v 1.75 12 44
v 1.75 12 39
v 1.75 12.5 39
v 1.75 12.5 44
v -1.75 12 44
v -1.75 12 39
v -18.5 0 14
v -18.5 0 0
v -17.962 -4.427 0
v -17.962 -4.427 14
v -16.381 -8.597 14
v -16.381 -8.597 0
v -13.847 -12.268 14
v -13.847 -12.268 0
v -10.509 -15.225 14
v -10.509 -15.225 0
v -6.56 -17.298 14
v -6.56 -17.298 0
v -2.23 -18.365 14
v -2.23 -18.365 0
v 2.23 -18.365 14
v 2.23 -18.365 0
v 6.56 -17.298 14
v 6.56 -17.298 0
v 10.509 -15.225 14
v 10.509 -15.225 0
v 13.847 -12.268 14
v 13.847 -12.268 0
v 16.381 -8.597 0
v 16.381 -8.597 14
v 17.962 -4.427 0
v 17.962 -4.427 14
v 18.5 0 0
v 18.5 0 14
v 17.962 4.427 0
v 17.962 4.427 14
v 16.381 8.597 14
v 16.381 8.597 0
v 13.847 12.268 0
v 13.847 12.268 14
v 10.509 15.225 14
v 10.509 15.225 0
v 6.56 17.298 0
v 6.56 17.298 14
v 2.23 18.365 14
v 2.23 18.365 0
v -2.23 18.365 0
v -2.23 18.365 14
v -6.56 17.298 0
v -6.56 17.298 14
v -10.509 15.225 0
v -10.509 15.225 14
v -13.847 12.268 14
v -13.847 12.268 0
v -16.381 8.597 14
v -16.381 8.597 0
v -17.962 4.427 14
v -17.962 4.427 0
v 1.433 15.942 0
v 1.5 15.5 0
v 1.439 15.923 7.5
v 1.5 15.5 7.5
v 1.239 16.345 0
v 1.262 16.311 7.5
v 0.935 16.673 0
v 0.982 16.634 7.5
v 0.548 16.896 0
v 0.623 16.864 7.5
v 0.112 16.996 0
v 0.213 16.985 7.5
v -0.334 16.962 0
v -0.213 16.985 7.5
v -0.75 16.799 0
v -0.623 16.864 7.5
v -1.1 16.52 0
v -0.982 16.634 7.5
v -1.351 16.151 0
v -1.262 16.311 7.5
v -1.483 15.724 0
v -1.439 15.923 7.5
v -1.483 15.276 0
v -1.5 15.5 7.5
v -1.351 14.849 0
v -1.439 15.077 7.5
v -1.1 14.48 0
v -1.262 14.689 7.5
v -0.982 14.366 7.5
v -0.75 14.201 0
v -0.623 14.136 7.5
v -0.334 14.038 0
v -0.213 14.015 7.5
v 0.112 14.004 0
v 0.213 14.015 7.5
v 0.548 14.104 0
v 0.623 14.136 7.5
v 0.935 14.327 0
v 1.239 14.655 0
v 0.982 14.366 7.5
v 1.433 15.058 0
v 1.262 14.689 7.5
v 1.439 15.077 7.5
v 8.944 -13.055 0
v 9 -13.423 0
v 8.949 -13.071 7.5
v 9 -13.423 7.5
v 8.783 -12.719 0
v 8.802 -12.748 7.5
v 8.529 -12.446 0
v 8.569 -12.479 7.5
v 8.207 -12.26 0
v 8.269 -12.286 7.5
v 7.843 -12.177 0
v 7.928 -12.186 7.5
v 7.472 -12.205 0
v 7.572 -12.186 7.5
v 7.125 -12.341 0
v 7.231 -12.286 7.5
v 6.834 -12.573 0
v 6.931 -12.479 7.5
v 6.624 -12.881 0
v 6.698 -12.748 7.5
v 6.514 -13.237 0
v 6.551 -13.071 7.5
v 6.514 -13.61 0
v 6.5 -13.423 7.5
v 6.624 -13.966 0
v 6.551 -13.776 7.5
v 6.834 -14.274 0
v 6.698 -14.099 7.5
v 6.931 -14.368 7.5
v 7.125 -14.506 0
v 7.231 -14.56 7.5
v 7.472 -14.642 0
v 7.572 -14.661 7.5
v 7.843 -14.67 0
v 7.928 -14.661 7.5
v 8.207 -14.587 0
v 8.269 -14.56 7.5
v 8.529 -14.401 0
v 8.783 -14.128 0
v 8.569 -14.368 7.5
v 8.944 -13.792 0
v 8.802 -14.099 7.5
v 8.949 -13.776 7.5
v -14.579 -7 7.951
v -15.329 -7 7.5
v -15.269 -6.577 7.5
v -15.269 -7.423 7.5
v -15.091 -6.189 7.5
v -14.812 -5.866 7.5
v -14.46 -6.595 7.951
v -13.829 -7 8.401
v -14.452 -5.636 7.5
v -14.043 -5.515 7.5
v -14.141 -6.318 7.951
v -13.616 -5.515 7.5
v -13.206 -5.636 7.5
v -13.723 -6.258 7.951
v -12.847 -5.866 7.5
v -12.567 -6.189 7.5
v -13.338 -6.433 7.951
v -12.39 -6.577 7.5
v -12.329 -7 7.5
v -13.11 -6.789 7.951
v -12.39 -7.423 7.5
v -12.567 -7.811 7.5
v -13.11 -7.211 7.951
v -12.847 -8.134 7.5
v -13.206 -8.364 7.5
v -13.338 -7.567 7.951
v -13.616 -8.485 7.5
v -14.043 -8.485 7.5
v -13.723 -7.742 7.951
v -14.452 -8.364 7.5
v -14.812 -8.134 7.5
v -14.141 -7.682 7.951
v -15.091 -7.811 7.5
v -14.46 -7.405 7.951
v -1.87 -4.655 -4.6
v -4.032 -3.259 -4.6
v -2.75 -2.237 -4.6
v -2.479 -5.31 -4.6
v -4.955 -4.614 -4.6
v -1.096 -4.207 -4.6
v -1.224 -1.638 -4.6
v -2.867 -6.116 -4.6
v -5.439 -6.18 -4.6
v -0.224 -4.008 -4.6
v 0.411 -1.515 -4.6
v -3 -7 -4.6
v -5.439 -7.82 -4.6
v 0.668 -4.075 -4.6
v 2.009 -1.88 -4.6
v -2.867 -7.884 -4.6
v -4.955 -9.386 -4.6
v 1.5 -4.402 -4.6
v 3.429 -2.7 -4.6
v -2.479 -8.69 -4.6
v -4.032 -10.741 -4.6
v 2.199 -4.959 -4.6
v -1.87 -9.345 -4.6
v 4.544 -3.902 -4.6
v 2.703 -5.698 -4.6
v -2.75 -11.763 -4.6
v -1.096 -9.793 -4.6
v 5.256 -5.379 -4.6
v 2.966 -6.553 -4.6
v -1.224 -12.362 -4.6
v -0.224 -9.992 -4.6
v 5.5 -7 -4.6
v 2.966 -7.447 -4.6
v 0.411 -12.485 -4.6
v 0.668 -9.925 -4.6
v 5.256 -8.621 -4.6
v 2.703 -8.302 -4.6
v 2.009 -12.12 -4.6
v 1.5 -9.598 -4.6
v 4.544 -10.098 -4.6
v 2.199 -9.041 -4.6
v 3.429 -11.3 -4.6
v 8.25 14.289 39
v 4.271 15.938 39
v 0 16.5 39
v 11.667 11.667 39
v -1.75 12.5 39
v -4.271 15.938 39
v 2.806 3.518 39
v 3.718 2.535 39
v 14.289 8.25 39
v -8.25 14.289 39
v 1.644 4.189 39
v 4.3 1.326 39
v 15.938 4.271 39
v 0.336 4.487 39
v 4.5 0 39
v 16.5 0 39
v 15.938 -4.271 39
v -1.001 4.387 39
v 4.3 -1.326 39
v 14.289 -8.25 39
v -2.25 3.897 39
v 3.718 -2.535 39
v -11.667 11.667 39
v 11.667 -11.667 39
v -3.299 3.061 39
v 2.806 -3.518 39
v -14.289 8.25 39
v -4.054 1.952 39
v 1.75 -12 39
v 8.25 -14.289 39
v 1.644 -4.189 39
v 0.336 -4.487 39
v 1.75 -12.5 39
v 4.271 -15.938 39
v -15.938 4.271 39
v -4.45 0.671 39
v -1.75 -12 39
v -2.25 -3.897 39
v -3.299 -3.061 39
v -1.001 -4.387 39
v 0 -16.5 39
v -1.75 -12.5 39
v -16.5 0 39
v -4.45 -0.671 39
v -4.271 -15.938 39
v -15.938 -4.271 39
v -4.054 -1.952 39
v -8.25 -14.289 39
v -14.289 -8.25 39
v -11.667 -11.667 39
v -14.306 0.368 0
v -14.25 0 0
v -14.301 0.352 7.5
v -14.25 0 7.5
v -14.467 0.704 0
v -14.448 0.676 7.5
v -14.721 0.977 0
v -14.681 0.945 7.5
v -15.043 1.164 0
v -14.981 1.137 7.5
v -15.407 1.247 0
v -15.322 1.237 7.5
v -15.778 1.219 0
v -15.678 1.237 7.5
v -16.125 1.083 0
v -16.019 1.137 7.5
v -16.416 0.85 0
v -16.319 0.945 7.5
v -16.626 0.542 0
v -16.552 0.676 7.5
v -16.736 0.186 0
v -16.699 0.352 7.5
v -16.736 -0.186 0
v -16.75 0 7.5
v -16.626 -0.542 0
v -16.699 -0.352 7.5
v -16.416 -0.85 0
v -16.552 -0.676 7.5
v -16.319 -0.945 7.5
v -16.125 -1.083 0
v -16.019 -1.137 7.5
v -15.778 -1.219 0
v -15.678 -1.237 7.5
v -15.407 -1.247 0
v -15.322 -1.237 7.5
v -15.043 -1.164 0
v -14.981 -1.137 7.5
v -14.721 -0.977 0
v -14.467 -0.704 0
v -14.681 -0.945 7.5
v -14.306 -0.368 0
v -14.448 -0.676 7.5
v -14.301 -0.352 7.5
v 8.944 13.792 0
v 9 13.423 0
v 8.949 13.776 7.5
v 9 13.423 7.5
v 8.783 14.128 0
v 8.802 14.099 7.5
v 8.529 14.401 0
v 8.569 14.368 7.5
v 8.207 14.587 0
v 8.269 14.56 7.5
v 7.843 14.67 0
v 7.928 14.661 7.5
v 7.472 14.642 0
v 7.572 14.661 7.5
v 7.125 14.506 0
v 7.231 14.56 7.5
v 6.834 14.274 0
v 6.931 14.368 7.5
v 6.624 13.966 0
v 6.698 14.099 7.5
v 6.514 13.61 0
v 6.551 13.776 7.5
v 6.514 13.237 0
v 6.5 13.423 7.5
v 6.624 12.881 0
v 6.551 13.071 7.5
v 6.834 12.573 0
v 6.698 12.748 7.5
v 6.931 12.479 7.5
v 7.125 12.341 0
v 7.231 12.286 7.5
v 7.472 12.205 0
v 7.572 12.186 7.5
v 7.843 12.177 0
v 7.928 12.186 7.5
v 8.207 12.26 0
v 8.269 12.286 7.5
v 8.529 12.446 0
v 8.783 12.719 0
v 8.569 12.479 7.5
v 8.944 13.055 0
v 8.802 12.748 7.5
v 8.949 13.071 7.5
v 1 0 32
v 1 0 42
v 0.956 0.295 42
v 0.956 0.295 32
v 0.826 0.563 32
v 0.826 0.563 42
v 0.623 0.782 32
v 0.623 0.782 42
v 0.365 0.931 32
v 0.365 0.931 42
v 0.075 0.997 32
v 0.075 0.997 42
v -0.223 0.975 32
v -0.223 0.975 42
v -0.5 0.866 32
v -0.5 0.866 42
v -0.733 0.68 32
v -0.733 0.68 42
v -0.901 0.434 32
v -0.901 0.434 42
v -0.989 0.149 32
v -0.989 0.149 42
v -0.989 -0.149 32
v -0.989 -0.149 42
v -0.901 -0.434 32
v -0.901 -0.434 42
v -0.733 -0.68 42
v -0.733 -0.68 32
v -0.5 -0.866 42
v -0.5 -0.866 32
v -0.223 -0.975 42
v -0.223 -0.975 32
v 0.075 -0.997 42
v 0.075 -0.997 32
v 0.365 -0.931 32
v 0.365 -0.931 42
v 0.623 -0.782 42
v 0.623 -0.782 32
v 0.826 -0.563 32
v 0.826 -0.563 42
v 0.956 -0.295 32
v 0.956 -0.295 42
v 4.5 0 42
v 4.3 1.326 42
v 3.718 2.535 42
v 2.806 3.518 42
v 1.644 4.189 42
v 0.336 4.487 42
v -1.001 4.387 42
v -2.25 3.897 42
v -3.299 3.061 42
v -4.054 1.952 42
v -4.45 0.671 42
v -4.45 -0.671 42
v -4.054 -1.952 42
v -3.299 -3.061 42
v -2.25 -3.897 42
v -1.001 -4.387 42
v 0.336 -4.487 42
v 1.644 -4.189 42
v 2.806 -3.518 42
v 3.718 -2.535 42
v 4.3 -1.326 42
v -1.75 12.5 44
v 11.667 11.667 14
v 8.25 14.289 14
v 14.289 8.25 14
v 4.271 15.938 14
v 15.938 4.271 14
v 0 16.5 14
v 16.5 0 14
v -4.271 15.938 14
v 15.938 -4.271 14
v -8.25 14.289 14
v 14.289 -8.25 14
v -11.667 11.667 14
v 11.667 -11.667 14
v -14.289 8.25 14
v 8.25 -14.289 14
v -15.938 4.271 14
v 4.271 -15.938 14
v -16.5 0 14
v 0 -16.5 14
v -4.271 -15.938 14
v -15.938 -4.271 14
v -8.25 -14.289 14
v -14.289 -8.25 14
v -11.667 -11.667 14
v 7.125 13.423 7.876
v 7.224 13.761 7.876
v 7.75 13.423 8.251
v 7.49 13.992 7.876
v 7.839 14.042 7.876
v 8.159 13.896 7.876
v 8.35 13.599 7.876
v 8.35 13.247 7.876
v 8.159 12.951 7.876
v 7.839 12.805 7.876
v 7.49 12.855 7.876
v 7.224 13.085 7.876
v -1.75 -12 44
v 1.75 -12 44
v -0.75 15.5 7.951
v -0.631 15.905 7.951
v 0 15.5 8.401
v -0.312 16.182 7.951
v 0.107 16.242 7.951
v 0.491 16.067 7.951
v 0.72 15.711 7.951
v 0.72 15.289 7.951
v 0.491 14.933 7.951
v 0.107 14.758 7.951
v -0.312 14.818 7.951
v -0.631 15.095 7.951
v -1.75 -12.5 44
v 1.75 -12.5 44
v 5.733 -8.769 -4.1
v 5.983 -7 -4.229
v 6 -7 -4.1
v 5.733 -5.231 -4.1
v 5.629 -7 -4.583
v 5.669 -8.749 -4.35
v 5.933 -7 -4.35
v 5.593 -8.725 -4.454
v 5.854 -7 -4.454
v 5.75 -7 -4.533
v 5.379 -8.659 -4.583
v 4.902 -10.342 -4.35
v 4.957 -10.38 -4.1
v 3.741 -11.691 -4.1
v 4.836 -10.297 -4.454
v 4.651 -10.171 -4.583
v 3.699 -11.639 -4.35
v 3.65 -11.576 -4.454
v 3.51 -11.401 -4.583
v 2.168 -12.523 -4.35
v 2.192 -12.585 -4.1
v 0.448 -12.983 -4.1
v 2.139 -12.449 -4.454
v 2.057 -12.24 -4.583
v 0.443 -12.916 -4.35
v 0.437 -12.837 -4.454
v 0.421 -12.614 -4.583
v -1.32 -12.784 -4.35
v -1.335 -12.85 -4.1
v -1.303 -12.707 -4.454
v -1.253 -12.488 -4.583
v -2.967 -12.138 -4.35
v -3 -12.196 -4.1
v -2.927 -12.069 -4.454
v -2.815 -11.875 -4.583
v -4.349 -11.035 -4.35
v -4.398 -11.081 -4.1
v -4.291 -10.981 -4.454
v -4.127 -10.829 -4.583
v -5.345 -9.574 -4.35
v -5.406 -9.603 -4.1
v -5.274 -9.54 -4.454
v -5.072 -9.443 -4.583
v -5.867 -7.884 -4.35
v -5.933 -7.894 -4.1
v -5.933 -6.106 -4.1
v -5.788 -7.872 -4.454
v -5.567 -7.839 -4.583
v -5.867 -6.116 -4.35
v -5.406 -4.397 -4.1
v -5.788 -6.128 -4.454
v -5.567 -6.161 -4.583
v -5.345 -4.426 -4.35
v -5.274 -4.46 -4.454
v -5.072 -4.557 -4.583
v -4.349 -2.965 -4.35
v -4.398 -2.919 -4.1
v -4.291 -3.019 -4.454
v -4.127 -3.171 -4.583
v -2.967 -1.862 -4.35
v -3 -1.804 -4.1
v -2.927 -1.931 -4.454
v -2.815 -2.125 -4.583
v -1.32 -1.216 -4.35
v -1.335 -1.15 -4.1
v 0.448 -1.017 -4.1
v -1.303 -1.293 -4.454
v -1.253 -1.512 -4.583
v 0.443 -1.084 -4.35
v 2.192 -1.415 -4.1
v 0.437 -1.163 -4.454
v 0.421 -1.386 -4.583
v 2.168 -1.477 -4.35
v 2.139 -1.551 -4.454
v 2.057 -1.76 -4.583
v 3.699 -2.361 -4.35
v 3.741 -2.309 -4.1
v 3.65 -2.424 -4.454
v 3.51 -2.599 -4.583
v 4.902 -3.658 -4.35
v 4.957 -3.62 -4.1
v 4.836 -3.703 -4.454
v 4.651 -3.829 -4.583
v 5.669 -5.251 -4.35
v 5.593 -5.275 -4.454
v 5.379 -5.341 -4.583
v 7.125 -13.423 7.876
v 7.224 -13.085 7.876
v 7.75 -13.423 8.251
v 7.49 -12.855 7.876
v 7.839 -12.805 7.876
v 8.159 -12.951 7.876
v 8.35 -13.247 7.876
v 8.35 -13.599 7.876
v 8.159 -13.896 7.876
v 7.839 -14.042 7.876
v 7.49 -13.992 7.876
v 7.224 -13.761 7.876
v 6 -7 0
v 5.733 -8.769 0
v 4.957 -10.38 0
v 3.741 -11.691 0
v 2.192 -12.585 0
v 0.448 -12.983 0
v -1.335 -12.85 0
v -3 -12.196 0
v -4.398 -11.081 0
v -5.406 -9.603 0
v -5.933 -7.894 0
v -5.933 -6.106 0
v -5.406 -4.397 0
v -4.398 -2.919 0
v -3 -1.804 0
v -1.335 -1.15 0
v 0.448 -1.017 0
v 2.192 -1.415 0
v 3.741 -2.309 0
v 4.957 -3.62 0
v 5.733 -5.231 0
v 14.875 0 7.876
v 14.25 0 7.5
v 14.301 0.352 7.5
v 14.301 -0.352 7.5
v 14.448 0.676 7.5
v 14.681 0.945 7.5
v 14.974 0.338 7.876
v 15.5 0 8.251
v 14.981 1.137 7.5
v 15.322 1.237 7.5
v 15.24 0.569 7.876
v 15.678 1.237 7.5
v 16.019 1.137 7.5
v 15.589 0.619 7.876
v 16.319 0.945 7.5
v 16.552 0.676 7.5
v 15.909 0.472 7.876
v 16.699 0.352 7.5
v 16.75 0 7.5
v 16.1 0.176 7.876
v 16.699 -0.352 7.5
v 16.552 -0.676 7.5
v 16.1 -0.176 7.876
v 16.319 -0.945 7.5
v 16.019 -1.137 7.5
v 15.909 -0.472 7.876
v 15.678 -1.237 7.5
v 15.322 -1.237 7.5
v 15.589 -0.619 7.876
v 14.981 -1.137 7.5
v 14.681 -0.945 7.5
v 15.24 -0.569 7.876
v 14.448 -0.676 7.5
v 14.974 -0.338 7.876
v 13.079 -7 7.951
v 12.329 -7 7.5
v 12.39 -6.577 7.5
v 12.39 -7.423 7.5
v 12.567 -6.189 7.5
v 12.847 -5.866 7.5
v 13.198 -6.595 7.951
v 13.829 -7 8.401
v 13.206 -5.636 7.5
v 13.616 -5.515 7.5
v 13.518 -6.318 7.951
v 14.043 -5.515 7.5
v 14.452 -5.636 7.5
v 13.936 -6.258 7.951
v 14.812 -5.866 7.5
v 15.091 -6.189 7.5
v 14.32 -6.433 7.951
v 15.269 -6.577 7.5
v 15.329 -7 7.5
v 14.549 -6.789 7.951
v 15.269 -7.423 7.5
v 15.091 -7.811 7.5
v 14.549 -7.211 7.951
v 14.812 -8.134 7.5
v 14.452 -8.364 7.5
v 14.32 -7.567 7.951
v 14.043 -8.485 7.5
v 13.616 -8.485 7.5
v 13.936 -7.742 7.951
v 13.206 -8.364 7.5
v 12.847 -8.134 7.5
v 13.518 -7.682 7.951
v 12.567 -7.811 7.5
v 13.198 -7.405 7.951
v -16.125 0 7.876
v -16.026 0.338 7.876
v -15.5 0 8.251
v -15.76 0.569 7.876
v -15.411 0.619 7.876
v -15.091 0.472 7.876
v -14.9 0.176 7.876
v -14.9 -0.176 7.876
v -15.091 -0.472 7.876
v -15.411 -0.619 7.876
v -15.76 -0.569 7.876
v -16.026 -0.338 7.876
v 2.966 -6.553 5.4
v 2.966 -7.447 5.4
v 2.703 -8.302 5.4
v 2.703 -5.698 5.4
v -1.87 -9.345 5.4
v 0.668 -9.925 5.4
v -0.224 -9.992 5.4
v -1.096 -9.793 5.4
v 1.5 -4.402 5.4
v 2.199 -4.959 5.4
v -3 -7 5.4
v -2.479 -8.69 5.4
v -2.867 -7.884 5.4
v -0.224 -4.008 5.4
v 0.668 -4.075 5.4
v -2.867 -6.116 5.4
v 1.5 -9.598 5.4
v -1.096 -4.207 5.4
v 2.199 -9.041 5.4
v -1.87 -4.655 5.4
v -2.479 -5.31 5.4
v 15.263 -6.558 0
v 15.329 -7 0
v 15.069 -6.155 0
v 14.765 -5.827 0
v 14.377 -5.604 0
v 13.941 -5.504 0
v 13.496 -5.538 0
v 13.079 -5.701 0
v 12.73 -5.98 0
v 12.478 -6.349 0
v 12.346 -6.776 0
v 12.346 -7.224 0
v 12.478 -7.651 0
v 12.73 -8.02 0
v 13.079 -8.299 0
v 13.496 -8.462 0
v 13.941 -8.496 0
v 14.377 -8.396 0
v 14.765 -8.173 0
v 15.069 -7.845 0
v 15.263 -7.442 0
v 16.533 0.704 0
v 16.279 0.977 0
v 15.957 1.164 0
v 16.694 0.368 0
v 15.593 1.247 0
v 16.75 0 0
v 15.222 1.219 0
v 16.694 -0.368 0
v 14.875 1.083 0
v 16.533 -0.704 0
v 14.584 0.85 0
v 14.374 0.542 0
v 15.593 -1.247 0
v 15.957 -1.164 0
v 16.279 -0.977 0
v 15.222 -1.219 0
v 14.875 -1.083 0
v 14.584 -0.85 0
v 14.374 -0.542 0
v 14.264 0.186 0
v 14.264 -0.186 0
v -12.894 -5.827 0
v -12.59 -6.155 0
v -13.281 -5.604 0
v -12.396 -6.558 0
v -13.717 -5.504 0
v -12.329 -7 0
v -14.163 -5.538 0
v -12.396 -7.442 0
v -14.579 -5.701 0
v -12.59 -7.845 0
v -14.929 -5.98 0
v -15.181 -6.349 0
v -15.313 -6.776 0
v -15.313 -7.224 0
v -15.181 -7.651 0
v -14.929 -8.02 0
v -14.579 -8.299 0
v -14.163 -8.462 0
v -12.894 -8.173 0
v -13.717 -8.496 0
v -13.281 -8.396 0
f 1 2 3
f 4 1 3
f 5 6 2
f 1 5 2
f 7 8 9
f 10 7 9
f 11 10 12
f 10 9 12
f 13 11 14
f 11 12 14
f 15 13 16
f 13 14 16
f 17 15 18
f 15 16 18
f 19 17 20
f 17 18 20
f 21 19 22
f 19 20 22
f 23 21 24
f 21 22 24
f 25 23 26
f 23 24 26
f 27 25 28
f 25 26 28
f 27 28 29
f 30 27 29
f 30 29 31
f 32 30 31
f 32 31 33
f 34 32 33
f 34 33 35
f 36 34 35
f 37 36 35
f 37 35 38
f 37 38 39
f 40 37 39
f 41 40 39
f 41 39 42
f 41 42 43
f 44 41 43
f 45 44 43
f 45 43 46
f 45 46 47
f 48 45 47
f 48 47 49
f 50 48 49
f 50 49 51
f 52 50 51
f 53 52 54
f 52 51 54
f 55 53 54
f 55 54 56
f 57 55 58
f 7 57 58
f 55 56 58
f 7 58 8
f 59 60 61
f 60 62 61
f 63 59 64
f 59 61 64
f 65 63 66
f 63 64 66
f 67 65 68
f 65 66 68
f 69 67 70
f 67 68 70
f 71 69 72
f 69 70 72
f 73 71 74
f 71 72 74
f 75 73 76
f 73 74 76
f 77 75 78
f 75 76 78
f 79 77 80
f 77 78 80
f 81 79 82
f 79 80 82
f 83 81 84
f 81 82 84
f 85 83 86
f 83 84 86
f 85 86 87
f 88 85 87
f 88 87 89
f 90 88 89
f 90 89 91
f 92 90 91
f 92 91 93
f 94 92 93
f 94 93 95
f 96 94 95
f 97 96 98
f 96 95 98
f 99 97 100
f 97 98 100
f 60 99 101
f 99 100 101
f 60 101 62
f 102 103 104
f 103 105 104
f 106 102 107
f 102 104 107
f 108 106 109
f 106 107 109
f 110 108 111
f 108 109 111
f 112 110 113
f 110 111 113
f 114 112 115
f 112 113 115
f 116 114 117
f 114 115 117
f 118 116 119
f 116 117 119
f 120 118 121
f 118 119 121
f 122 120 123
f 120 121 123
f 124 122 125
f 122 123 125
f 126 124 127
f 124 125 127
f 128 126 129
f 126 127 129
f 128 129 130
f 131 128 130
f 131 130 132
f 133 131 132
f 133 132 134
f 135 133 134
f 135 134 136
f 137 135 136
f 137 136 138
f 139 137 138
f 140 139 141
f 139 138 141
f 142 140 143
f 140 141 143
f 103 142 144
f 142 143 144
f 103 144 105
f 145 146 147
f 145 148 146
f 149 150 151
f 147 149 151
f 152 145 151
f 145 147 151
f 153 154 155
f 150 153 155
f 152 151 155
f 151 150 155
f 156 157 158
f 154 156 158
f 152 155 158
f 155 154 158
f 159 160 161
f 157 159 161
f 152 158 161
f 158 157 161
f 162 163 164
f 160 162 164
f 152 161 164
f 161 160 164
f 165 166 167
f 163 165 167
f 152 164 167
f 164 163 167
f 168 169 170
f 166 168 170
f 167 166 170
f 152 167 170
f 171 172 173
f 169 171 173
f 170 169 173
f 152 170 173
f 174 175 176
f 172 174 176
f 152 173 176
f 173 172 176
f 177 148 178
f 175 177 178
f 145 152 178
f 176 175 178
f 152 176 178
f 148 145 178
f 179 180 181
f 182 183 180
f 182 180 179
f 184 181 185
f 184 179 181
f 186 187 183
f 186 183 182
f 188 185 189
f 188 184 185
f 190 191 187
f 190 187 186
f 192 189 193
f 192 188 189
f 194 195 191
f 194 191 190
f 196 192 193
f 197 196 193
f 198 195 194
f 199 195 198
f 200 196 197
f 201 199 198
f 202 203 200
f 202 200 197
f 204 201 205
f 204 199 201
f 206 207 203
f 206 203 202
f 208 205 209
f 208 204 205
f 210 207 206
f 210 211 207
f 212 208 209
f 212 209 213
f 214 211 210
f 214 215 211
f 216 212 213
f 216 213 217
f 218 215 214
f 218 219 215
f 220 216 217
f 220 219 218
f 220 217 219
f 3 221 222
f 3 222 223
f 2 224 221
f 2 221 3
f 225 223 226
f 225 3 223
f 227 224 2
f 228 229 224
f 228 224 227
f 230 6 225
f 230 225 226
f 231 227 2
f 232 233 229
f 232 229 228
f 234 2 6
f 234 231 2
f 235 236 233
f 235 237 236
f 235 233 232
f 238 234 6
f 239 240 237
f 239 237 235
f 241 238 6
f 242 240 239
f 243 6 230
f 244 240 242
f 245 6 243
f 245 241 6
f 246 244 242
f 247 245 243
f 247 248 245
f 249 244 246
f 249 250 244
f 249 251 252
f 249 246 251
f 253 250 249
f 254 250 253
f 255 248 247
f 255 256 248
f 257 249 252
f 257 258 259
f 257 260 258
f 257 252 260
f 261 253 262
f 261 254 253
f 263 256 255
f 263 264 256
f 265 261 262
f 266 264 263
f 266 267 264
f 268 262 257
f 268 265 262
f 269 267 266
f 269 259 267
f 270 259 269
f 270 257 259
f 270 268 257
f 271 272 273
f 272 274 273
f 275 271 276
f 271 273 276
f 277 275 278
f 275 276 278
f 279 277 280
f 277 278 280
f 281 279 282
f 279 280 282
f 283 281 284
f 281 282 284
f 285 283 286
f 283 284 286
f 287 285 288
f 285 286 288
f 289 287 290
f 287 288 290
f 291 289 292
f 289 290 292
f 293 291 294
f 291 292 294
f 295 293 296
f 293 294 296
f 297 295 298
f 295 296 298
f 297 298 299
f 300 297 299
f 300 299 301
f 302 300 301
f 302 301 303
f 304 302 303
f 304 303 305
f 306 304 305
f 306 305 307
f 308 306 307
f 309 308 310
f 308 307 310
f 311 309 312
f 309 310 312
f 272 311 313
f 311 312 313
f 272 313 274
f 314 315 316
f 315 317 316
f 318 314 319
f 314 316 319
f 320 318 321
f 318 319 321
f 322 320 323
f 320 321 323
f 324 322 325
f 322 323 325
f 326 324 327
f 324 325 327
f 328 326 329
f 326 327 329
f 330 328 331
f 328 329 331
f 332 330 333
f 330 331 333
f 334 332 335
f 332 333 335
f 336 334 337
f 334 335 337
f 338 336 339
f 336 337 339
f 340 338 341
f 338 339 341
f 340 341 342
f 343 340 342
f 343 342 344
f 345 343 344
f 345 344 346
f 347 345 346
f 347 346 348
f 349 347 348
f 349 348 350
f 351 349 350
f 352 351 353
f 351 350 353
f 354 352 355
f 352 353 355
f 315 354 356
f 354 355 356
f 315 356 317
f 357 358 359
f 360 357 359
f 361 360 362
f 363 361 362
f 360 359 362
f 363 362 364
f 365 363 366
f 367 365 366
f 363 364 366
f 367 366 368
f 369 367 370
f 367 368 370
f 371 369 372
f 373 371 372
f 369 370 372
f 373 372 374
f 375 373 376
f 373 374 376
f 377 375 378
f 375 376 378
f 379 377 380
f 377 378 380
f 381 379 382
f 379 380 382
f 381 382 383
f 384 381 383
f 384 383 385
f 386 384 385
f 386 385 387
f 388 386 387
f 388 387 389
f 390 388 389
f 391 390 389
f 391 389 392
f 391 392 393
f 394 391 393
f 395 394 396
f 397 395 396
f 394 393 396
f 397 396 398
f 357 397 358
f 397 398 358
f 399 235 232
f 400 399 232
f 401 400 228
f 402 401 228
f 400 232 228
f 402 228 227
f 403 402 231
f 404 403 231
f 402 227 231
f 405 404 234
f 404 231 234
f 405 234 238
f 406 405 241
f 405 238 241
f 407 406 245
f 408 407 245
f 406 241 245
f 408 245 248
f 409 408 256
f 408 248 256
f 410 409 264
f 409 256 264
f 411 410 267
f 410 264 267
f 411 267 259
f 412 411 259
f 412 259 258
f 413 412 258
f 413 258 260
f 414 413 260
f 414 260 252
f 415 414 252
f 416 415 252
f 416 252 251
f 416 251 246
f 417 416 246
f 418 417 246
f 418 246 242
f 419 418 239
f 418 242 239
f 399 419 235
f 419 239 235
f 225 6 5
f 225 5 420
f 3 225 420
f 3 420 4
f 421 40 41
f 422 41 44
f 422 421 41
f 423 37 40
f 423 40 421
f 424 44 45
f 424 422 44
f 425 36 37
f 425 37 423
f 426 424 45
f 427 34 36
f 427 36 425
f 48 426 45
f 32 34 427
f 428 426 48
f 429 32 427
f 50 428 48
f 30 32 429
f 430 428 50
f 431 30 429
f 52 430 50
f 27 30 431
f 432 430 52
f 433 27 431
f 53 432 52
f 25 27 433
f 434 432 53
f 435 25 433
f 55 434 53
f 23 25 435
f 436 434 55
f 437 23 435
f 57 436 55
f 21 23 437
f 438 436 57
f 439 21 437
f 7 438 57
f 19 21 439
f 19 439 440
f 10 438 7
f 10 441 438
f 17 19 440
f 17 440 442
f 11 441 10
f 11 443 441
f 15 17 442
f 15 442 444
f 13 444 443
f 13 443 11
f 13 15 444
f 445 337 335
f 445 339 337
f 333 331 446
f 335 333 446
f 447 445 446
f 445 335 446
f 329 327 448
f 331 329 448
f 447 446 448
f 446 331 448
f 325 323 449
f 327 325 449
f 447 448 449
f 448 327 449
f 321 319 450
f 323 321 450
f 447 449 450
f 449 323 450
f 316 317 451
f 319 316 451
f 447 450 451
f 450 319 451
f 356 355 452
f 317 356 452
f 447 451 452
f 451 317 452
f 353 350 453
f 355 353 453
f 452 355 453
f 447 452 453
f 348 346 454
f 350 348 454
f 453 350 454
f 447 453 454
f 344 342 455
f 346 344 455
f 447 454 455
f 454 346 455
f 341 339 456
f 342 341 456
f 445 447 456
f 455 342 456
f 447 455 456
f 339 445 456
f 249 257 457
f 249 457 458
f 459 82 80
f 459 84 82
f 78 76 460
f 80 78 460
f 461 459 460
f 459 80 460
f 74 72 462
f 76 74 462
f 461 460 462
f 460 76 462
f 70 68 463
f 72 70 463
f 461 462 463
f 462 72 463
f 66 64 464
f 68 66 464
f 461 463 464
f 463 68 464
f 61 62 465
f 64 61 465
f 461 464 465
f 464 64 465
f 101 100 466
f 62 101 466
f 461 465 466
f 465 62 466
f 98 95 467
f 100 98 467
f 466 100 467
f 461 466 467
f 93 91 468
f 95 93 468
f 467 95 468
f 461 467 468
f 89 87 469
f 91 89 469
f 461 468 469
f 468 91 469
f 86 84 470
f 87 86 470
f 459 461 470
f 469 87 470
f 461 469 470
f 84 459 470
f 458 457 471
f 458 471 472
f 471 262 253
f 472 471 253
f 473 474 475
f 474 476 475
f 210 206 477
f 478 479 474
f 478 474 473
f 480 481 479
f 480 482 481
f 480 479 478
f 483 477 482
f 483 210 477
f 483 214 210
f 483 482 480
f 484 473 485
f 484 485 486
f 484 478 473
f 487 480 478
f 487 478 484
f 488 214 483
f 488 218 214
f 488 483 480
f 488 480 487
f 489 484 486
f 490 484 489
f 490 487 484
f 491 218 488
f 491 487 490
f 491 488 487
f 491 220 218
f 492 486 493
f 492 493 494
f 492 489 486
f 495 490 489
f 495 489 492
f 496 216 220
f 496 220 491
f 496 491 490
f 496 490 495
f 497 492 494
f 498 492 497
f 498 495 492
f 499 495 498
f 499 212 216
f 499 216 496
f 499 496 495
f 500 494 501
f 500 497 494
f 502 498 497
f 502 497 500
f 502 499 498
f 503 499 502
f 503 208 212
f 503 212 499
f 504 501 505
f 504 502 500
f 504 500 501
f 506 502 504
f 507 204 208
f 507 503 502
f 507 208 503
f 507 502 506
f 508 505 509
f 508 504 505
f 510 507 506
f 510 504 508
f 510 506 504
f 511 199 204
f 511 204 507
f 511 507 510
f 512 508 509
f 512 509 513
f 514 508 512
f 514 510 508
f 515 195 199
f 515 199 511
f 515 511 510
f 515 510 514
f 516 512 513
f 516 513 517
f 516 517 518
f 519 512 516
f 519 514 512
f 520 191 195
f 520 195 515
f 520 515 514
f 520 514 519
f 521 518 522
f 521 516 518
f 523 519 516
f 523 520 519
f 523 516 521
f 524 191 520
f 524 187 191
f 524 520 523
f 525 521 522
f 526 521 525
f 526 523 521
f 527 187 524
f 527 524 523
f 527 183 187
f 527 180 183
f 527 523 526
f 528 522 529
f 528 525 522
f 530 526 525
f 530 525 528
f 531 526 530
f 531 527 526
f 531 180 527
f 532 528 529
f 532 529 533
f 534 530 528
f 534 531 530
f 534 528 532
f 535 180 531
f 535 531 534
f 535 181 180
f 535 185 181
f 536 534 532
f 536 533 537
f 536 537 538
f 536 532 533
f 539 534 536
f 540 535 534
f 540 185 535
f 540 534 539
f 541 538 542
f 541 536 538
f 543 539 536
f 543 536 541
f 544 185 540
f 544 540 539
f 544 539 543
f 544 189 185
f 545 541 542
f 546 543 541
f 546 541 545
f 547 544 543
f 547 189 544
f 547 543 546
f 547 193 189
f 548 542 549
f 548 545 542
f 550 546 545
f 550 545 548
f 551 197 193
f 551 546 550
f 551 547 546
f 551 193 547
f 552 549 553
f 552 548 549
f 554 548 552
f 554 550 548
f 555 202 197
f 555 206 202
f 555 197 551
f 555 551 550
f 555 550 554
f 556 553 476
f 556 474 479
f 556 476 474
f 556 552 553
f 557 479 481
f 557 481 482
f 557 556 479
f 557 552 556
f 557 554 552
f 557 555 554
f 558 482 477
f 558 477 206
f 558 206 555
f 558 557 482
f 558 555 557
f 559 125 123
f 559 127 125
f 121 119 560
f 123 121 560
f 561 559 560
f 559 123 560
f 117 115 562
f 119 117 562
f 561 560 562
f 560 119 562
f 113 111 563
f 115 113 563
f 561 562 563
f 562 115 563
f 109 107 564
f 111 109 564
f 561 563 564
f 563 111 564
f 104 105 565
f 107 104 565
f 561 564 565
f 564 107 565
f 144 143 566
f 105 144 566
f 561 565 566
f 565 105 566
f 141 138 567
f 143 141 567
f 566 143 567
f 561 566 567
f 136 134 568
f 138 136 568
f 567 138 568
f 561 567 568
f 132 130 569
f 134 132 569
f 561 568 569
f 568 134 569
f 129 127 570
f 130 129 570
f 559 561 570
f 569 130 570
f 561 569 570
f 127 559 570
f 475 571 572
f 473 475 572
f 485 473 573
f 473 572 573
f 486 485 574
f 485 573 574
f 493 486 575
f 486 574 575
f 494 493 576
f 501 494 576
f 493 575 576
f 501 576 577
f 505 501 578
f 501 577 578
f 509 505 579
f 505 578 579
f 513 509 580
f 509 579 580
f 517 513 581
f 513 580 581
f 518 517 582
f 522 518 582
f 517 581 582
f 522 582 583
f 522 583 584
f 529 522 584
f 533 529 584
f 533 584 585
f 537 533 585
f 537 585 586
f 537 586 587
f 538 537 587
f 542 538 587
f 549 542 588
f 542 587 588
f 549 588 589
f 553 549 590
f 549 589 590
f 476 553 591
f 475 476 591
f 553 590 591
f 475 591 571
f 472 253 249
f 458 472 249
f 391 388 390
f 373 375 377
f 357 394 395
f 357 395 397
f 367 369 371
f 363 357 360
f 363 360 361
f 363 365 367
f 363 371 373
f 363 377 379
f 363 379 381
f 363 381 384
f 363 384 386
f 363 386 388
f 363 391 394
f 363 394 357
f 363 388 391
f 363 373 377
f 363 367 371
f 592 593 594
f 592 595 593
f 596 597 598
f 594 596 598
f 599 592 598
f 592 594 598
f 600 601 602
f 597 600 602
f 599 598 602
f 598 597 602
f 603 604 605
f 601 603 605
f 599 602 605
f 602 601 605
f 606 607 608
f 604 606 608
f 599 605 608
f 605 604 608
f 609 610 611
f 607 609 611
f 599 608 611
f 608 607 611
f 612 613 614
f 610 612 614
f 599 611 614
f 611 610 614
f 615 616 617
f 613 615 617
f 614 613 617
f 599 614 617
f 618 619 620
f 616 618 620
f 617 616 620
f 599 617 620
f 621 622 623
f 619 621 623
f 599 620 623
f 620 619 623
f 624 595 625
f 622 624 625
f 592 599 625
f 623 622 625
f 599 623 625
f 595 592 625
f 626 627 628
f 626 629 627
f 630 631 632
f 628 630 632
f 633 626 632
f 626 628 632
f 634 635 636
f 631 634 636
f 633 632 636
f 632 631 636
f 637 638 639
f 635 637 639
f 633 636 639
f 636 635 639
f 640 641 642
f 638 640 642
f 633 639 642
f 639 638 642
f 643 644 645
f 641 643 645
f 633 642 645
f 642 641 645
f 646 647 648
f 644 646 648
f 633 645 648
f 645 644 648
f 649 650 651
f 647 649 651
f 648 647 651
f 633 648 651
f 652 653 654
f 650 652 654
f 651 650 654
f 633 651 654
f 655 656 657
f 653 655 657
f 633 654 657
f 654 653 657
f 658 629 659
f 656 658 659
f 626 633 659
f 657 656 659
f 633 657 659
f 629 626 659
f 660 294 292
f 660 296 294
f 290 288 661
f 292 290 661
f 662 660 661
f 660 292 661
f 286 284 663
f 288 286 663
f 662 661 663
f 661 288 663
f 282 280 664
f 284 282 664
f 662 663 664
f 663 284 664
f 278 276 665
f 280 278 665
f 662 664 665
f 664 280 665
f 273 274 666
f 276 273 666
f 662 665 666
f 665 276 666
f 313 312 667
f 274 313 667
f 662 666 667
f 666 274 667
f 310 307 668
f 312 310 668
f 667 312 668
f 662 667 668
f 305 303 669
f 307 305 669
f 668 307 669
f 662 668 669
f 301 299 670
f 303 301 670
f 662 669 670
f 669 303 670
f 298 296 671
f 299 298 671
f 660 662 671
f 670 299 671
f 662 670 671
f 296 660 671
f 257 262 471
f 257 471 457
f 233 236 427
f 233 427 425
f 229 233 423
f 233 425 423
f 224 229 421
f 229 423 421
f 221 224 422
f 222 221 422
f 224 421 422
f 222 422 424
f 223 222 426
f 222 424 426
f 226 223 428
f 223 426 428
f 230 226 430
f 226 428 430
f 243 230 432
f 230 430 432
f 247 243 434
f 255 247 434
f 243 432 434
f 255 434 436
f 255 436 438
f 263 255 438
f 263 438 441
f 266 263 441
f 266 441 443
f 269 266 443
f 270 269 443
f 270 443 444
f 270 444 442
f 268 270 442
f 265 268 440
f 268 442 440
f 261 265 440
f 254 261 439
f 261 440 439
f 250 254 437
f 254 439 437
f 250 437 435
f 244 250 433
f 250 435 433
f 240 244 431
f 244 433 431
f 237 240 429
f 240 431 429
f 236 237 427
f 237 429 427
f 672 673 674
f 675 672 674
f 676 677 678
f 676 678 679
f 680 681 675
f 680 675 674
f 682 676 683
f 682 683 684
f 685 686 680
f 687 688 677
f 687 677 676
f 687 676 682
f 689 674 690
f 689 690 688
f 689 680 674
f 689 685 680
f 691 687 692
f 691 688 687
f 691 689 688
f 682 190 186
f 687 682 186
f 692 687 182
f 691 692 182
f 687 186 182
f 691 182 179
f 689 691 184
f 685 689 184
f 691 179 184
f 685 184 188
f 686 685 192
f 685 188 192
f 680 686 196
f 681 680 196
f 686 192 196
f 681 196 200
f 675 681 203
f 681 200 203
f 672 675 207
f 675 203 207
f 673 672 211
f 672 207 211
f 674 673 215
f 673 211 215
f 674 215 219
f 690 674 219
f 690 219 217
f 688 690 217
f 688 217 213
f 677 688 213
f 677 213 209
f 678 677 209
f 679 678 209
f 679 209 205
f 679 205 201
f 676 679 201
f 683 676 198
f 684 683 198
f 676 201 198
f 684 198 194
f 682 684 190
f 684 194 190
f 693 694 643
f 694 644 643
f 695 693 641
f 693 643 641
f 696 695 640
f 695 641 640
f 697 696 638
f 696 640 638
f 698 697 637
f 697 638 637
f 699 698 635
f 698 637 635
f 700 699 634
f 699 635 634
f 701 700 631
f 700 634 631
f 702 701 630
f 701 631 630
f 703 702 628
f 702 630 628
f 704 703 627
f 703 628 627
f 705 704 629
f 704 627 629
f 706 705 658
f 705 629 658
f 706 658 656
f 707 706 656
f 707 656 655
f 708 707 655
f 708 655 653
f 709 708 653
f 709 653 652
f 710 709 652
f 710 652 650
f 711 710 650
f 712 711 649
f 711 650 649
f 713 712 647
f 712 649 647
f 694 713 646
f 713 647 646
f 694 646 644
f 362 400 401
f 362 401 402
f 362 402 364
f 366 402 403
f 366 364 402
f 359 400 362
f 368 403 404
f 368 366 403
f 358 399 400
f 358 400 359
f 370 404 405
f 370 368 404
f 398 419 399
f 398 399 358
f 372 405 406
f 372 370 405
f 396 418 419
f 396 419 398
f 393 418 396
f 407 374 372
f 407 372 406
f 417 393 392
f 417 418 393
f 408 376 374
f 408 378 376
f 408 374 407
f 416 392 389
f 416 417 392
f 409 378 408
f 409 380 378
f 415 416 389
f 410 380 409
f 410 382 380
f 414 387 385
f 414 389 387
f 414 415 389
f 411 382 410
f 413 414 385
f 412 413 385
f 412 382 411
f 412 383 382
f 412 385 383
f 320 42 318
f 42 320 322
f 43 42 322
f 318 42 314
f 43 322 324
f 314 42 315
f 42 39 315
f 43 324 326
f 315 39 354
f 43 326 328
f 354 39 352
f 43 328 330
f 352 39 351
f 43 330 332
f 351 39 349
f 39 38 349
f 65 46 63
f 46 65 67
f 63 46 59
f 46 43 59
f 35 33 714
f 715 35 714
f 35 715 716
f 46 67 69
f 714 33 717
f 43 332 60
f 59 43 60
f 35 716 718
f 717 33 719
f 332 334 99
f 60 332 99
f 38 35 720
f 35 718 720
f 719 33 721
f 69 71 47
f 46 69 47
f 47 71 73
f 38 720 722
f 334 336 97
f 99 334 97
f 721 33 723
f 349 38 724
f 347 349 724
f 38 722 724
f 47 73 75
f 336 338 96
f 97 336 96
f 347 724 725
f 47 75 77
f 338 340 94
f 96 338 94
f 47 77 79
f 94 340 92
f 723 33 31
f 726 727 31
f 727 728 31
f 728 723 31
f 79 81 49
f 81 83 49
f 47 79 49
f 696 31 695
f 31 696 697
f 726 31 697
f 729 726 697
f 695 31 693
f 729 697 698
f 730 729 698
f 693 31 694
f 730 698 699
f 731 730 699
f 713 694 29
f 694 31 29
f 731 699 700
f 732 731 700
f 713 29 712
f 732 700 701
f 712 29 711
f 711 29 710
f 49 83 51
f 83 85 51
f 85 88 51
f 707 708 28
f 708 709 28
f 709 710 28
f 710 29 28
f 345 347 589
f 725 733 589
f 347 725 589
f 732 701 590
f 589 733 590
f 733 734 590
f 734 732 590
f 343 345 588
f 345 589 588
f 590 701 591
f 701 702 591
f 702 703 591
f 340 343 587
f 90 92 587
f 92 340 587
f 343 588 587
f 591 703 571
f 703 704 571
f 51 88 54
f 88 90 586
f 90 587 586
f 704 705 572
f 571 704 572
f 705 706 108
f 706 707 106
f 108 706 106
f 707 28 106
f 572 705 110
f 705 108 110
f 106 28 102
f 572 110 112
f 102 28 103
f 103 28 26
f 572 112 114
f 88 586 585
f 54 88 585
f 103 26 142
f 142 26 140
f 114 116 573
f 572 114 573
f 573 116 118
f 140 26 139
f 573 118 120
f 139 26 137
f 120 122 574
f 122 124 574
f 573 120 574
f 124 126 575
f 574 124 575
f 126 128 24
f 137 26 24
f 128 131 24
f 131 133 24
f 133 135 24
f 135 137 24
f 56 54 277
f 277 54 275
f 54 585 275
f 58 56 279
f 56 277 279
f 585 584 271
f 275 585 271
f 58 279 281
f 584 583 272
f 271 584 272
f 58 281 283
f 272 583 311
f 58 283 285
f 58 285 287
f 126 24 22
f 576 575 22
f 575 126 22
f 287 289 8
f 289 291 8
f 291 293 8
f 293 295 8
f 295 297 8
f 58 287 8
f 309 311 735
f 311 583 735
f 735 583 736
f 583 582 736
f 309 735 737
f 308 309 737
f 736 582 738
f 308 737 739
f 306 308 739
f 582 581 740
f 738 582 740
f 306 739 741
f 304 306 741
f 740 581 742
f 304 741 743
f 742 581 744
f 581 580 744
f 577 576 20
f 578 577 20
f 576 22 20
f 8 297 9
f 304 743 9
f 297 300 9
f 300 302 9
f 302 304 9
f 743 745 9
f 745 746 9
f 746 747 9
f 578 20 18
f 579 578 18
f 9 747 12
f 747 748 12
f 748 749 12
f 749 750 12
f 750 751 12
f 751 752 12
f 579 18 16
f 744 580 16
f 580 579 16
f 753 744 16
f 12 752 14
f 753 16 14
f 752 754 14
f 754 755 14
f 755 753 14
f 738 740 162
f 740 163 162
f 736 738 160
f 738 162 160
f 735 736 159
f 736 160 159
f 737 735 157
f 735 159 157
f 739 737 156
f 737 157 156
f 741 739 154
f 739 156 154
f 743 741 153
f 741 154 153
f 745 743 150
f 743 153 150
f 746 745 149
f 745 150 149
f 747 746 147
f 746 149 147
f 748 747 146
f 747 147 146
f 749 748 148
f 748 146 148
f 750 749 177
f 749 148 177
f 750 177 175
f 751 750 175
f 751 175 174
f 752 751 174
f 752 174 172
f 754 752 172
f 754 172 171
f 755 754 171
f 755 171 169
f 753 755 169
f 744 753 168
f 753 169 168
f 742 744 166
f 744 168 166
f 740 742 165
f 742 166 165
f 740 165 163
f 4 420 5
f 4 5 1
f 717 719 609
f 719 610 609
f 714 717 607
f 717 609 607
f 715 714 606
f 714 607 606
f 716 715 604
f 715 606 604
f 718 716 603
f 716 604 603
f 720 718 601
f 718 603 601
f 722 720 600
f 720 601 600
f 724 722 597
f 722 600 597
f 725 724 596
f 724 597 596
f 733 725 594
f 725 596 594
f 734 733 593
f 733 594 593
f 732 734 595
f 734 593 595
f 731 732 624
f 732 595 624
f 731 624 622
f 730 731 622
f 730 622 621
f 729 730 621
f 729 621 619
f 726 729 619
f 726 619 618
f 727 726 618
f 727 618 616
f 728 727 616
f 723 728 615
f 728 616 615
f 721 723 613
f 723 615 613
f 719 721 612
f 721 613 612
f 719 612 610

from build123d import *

# Parameters (mm, degrees)
SKETCH1_R                 = 18.5
BOSS_EXTRUDE1_DEPTH       = 42
CUT_EXTRUDE1_START        = -3
SKETCH2_R                 = 18.5
SKETCH2_R_2               = 4.5
CUT_EXTRUDE1_DEPTH        = 3
CUT_EXTRUDE4_START        = -25
SKETCH3_R                 = 18.5
SKETCH3_R_2               = 16.5
CUT_EXTRUDE4_DEPTH        = 25
SKETCH4_R                 = 6
BOSS_EXTRUDE2_DEPTH       = 4.6
FILLET1_R                 = 0.5
SKETCH5_R                 = 3
CUT_EXTRUDE5_DEPTH        = 10
SKETCH6_R                 = 1
CUT_EXTRUDE6_DEPTH        = 10
SKETCH7_W                 = 3.5
SKETCH7_H                 = 0.5
BOSS_EXTRUDE3_DEPTH       = 5
M3X0_5_TAPPED_HOLE1_D     = 2.5
M3X0_5_TAPPED_HOLE1_DEPTH = 7.5
M3X0_5_TAPPED_HOLE1_TIP   = 0.751075774
F_3_0MM_DOWEL_HOLE1_D     = 3
F_3_0MM_DOWEL_HOLE1_DEPTH = 7.5
F_3_0MM_DOWEL_HOLE1_TIP   = 0.901290929


with BuildPart() as part:
    # Sketch1 → Boss-Extrude1 (new body)
    with BuildSketch(Plane.XY):
        with Locations(Location((0, 0, 0), (0, 0, 180))):
            Circle(SKETCH1_R)
    extrude(amount=BOSS_EXTRUDE1_DEPTH)

    # Sketch2 → Cut-Extrude1 (cut)
    with BuildSketch(Plane.XY.offset(42).offset(CUT_EXTRUDE1_START)):
        with Locations(Location((0, 0, 0), (0, 0, 180))):
            Circle(SKETCH2_R)
        Circle(SKETCH2_R_2, mode=Mode.SUBTRACT)
    extrude(amount=CUT_EXTRUDE1_DEPTH, mode=Mode.SUBTRACT)

    # Sketch3 → Cut-Extrude4 (cut)
    with BuildSketch(Plane.XY.offset(39).offset(CUT_EXTRUDE4_START)):
        with Locations(Location((0, 0, 0), (0, 0, 180))):
            Circle(SKETCH3_R)
        Circle(SKETCH3_R_2, mode=Mode.SUBTRACT)
    extrude(amount=CUT_EXTRUDE4_DEPTH, mode=Mode.SUBTRACT)

    # Sketch4 → Boss-Extrude2 (add)
    with BuildSketch(Plane(origin=(0, 0, 0), x_dir=(-1, 0, 0), z_dir=(0, 0, -1))):
        with Locations(Location((0, -7, 0), (0, 0, 180))):
            Circle(SKETCH4_R)
    extrude(amount=BOSS_EXTRUDE2_DEPTH)

    # Fillet1
    fillet1_edges = [part.edges().sort_by_distance(p)[0] for p in [
        (-6, -7, -4.6),
    ]]
    fillet(fillet1_edges, radius=FILLET1_R)

    # Sketch5 → Cut-Extrude5 (cut)
    with BuildSketch(Plane(origin=(0, 0, -4.6), x_dir=(-1, 0, 0), z_dir=(0, 0, -1))):
        with Locations((0, -7)):
            Circle(SKETCH5_R)
    extrude(amount=-CUT_EXTRUDE5_DEPTH, mode=Mode.SUBTRACT)

    # Sketch6 → Cut-Extrude6 (cut)
    with BuildSketch(Plane.XY.offset(42)):
        Circle(SKETCH6_R)
    extrude(amount=-CUT_EXTRUDE6_DEPTH, mode=Mode.SUBTRACT)

    # Sketch7 → Boss-Extrude3 (add)
    with BuildSketch(Plane.XY.offset(39)):
        with Locations((0, 12.25)):
            Rectangle(SKETCH7_W, SKETCH7_H)
        with Locations((0, -12.25)):
            Rectangle(SKETCH7_W, SKETCH7_H)
    extrude(amount=BOSS_EXTRUDE3_DEPTH)

    # M3x0.5 Tapped Hole1
    with Locations(Plane(origin=(0, 0, 0), x_dir=(-1, 0, 0), z_dir=(0, 0, -1))):
        with Locations((15.5, 0), (-7.75, 13.423393759), (-7.75, -13.423393759), (-15.5, 0)):
            Hole(M3X0_5_TAPPED_HOLE1_D / 2, depth=M3X0_5_TAPPED_HOLE1_DEPTH)
            with Locations((0, 0, -(M3X0_5_TAPPED_HOLE1_DEPTH + M3X0_5_TAPPED_HOLE1_TIP / 2))):  # 118° drill point
                Cone(0, M3X0_5_TAPPED_HOLE1_D / 2, M3X0_5_TAPPED_HOLE1_TIP, mode=Mode.SUBTRACT)

    # Ø3.0mm Dowel Hole1
    with Locations(Plane(origin=(0, 0, 0), x_dir=(-1, 0, 0), z_dir=(0, 0, -1))):
        with Locations((0, 15.5), (-13.829316686, -7), (13.829316686, -7)):
            Hole(F_3_0MM_DOWEL_HOLE1_D / 2, depth=F_3_0MM_DOWEL_HOLE1_DEPTH)
            with Locations((0, 0, -(F_3_0MM_DOWEL_HOLE1_DEPTH + F_3_0MM_DOWEL_HOLE1_TIP / 2))):  # 118° drill point
                Cone(0, F_3_0MM_DOWEL_HOLE1_D / 2, F_3_0MM_DOWEL_HOLE1_TIP, mode=Mode.SUBTRACT)


solid = part.part
